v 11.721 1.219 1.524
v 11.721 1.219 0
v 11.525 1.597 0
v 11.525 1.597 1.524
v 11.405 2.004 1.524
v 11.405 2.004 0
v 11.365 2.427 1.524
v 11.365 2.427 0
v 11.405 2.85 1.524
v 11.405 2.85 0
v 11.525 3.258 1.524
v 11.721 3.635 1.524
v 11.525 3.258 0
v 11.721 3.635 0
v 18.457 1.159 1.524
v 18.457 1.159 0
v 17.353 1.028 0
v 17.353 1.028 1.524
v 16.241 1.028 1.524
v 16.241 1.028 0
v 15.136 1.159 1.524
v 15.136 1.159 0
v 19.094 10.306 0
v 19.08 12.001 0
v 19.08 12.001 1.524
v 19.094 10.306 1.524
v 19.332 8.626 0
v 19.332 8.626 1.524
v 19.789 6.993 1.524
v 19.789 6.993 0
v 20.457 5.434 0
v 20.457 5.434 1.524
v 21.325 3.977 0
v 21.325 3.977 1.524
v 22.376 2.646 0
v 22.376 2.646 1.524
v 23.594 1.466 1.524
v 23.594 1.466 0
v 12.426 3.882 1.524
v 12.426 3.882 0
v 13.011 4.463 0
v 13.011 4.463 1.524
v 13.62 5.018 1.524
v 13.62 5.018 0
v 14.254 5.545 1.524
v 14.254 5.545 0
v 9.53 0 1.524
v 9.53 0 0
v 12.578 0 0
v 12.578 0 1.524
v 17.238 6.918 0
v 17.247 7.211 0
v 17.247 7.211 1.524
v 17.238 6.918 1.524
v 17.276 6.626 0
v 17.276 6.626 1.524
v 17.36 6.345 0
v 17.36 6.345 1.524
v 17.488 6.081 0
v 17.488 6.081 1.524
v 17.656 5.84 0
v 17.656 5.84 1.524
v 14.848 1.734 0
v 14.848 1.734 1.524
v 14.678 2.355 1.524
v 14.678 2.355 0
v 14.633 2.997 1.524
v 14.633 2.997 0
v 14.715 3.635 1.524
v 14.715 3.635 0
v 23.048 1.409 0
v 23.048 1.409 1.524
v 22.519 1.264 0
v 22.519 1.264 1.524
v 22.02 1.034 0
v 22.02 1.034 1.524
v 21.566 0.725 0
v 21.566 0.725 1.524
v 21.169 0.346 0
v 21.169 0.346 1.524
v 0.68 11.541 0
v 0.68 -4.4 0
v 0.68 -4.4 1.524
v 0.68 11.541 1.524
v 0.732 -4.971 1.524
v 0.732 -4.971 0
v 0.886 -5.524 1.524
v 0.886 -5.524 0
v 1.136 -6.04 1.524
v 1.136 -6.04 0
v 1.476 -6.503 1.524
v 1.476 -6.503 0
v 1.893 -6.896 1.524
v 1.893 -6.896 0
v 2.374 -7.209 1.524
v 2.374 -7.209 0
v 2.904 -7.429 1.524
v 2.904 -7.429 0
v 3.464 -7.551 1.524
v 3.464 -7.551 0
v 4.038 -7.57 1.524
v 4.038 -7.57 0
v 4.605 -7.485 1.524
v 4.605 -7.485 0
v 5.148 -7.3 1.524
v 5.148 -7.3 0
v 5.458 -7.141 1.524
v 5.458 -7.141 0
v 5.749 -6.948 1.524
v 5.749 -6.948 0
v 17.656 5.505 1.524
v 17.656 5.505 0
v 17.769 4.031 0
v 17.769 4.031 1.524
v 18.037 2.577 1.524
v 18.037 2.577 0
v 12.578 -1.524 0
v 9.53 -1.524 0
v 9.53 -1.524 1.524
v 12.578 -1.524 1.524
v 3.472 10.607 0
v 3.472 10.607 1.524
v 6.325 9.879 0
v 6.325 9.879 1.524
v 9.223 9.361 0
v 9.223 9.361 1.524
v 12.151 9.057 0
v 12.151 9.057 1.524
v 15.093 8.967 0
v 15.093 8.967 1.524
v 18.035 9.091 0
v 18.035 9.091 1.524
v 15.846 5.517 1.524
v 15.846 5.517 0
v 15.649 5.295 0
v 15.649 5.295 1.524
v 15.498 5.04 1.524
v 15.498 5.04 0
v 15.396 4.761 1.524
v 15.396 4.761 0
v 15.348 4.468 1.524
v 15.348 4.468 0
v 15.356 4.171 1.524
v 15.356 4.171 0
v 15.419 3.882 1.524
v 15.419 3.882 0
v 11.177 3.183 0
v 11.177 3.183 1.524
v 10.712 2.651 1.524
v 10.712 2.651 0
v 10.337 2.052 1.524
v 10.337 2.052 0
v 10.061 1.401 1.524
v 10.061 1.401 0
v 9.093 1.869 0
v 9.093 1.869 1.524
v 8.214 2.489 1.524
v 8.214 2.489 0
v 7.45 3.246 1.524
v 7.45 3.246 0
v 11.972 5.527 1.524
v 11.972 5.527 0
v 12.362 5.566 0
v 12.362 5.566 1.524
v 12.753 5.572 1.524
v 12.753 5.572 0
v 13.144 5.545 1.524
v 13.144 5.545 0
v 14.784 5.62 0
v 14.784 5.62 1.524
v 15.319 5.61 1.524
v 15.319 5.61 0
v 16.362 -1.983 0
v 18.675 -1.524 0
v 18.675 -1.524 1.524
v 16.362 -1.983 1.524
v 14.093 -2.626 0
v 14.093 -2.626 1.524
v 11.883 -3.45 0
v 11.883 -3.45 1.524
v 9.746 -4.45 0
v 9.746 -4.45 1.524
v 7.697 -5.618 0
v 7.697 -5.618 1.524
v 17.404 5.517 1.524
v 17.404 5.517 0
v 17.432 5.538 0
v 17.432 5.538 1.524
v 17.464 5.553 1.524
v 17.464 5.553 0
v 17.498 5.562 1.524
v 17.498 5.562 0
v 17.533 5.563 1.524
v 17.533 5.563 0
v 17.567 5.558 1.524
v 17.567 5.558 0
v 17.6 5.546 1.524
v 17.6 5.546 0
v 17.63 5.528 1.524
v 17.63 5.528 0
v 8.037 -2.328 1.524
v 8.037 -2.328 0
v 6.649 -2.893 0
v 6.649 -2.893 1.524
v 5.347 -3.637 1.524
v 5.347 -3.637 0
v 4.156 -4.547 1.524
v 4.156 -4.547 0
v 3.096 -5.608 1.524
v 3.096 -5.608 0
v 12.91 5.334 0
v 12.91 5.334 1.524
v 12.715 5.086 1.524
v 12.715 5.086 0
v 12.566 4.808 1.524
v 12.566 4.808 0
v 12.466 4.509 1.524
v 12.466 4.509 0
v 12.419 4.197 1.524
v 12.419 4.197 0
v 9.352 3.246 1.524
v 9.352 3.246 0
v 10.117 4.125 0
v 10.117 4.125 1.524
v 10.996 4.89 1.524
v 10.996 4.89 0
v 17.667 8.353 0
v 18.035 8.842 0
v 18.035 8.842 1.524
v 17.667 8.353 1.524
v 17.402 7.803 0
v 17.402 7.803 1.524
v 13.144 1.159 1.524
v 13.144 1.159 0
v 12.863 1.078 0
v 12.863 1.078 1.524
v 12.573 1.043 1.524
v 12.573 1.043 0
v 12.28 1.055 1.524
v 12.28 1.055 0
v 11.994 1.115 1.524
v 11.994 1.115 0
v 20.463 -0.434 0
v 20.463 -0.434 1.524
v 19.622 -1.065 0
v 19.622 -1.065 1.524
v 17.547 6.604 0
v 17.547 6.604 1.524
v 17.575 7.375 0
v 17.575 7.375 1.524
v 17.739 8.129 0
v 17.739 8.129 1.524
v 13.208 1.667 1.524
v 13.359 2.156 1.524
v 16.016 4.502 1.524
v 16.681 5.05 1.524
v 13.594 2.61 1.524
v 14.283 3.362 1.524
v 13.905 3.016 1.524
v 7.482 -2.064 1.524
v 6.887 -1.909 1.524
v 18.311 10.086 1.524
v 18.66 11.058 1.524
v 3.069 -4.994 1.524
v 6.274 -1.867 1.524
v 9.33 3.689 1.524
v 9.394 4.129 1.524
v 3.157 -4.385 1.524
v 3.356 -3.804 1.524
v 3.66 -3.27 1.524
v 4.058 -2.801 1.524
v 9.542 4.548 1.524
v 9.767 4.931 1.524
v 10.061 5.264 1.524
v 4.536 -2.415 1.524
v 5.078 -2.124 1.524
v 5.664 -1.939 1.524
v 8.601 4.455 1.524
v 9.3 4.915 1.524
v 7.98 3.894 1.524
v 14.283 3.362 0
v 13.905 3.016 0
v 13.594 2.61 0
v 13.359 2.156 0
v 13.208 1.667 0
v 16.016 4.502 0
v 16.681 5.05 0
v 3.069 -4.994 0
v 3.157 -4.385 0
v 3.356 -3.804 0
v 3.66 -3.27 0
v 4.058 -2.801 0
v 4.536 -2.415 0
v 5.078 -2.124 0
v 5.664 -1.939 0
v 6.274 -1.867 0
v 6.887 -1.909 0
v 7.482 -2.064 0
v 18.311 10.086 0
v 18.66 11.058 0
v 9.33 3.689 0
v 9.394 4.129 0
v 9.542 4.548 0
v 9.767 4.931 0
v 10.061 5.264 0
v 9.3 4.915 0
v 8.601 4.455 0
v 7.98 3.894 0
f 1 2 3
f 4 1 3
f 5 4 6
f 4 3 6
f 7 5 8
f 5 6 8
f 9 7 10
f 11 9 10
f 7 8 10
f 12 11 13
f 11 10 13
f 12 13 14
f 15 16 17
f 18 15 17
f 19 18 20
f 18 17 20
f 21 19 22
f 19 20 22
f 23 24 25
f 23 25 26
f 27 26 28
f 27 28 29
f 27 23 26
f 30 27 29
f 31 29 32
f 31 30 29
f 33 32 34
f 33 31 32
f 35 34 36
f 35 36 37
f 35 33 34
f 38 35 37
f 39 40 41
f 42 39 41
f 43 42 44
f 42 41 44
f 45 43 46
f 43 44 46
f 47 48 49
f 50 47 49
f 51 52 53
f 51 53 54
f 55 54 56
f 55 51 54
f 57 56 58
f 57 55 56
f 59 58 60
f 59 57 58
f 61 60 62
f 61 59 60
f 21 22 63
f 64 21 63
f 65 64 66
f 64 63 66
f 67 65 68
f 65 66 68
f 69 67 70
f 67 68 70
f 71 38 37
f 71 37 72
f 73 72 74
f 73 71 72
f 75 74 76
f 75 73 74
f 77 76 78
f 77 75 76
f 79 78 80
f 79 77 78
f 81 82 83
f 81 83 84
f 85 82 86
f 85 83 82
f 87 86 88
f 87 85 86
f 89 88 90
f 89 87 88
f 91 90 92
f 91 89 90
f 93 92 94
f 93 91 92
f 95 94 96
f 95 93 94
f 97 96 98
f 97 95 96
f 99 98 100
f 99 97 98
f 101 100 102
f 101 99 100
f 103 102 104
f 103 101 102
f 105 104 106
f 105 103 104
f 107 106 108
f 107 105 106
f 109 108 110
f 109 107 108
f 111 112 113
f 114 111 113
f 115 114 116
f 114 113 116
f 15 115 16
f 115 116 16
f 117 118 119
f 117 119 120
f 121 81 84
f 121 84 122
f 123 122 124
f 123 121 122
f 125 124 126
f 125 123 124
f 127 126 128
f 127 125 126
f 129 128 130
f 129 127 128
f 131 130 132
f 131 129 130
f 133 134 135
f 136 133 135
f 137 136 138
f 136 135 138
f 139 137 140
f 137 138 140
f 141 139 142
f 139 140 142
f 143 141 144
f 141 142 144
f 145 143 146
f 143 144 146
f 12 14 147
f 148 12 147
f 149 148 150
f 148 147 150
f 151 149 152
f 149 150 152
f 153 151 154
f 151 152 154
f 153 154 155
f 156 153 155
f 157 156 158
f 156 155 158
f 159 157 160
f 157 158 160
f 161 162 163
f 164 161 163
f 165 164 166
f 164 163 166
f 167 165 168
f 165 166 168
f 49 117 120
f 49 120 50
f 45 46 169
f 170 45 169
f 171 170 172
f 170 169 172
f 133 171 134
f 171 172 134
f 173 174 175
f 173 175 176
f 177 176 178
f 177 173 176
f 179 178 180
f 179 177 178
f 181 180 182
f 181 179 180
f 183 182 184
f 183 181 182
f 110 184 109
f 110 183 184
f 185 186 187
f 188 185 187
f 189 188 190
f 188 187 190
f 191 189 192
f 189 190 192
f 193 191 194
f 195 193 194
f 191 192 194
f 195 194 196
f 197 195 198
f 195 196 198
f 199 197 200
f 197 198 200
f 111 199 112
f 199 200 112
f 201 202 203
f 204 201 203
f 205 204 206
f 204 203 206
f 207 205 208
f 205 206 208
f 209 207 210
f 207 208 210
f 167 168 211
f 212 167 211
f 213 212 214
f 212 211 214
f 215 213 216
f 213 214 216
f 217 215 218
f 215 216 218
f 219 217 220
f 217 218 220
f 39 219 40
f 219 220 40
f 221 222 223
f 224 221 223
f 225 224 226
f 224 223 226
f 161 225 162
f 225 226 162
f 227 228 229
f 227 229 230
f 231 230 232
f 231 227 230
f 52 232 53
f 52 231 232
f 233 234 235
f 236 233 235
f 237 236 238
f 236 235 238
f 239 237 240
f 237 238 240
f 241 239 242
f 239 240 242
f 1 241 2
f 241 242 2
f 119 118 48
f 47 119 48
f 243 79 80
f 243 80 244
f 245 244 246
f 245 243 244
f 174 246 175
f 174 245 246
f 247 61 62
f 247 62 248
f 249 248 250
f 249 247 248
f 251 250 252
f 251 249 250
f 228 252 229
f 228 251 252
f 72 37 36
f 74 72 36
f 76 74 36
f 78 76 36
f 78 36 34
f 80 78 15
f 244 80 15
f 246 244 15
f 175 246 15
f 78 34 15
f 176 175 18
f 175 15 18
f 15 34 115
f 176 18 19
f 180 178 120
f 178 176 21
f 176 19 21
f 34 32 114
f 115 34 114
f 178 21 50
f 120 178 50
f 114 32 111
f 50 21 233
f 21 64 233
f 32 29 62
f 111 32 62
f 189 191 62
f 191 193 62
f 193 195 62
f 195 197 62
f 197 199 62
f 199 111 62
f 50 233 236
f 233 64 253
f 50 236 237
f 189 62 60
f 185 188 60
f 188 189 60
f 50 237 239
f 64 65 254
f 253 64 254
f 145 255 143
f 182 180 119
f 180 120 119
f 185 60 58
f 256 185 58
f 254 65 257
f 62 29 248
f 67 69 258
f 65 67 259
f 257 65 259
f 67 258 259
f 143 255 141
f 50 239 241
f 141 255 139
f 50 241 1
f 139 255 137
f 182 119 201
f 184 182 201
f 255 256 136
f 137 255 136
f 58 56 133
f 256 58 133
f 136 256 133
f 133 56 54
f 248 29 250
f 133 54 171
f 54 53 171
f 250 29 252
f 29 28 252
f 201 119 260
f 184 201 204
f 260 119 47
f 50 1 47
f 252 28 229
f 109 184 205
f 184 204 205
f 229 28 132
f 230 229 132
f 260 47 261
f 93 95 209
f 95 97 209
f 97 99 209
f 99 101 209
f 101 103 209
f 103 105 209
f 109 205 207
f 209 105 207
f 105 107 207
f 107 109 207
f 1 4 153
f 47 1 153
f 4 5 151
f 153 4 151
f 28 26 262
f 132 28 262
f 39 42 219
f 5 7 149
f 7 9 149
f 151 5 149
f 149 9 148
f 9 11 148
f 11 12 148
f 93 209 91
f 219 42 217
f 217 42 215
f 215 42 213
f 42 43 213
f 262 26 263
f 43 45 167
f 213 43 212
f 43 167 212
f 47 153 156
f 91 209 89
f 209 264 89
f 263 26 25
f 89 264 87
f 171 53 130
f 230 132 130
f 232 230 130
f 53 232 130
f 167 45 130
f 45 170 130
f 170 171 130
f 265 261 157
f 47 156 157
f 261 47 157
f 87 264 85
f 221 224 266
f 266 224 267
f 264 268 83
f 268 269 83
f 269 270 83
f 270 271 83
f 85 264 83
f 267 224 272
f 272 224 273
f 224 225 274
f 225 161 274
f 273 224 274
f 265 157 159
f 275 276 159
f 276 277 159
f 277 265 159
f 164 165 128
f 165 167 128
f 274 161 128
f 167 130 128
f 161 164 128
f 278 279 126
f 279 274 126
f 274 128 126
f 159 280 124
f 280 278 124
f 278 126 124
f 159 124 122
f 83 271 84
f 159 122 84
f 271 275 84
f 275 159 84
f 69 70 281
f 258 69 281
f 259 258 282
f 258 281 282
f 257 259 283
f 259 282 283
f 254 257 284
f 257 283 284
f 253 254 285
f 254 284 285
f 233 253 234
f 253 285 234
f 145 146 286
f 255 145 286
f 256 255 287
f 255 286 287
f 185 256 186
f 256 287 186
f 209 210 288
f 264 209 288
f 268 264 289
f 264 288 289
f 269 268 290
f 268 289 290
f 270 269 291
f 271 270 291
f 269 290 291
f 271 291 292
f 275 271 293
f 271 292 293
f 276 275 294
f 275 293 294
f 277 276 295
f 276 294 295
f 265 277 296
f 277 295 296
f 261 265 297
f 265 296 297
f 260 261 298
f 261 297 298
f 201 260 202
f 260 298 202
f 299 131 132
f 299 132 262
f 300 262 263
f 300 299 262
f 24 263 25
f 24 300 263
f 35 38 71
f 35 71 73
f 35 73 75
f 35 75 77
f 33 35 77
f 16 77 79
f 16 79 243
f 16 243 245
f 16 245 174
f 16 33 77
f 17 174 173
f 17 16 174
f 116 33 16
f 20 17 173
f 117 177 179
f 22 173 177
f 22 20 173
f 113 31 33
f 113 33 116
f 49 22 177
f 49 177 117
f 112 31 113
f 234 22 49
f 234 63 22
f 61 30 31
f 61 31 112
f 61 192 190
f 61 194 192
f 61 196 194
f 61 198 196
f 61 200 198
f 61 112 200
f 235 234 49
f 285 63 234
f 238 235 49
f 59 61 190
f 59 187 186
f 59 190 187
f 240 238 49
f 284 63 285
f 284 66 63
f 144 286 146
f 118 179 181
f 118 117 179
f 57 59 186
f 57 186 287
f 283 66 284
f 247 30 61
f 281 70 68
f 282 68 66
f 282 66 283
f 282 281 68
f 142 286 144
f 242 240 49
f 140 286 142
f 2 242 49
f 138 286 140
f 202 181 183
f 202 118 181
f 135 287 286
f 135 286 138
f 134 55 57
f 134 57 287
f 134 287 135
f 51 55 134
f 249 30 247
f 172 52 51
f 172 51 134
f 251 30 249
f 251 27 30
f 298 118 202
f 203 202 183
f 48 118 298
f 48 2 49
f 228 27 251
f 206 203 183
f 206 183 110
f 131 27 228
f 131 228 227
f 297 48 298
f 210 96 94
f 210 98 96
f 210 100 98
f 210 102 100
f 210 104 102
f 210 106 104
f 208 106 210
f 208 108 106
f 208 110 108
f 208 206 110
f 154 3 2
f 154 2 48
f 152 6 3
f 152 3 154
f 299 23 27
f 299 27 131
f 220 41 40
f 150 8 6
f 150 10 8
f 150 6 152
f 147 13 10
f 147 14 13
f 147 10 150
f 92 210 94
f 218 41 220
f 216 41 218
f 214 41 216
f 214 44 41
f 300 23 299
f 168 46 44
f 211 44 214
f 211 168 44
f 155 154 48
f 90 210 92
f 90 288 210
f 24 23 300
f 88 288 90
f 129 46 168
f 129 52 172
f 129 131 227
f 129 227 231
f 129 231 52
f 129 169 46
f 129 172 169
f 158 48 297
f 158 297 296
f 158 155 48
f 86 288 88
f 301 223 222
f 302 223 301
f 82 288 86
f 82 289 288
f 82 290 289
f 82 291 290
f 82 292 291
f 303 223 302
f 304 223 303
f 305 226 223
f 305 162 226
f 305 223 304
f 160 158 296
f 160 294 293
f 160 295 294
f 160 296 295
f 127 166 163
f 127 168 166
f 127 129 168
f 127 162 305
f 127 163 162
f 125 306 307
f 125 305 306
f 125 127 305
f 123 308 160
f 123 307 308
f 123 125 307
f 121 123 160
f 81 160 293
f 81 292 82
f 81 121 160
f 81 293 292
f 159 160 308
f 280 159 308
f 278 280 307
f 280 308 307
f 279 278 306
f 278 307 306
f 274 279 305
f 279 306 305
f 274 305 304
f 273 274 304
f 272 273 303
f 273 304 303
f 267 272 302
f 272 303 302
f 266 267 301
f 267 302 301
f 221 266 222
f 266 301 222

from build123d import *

# Parameters (mm, degrees)
SKETCH1_W           = 3.048
SKETCH1_H           = 1.524
BOSS_EXTRUDE1_DEPTH = 1.524
FILLET4_R           = 3.175


with BuildPart() as part:
    # Sketch1 → Boss-Extrude1 (new body)
    with BuildSketch(Plane.XY):
        with BuildLine():
            Line((0.680153889, -6.129418594), (0.680153889, 11.540681963))
            ThreePointArc((0.680153889, 11.540681963), (9.222616512, 9.36144264), (18.034529819, 9.091376803))
            ThreePointArc((18.034529819, 9.091376803), (18.476514137, 10.575327988), (19.079546917, 12.001446047))
            ThreePointArc((19.079546917, 12.001446047), (20.097392283, 6.202497031), (23.594187572, 1.465806036))
            ThreePointArc((23.594187572, 1.465806036), (22.264781917, 1.159048918), (21.169318906, 0.345796118))
            ThreePointArc((21.169318906, 0.345796118), (20.057462236, -0.769306292), (18.675392755, -1.524))
            ThreePointArc((18.675392755, -1.524), (10.681603645, -3.986495409), (3.71145902, -8.610523078))
            ThreePointArc((3.71145902, -8.610523078), (1.563251963, -8.142798296), (0.680153889, -6.129418594))
        make_face()
        with Locations((11.054430571, -0.762)):
            Rectangle(SKETCH1_W, SKETCH1_H, mode=Mode.SUBTRACT)
        with BuildLine():
            ThreePointArc((18.457205049, 1.159048918), (16.796602855, 1.012131062), (15.13600066, 1.159048918))
            ThreePointArc((15.13600066, 1.159048918), (14.678205729, 2.355037825), (14.715312916, 3.635111542))
            ThreePointArc((14.715312916, 3.635111542), (13.593992305, 2.610148755), (13.144305869, 1.159048918))
            ThreePointArc((13.144305869, 1.159048918), (12.426226698, 1.043141082), (11.720524566, 1.219370545))
            ThreePointArc((11.720524566, 1.219370545), (11.364676413, 2.427241044), (11.720524566, 3.635111542))
            ThreePointArc((11.720524566, 3.635111542), (10.712351561, 2.650528395), (10.061249405, 1.400775314))
            ThreePointArc((10.061249405, 1.400775314), (8.64082558, 2.160669947), (7.450155331, 3.245726654))
            ThreePointArc((7.450155331, 3.245726654), (8.601081625, 4.454929507), (10.061249405, 5.264072837))
            ThreePointArc((10.061249405, 5.264072837), (9.457771061, 4.34236946), (9.352425063, 3.245726654))
            ThreePointArc((9.352425063, 3.245726654), (10.543430802, 4.522443251), (11.971709271, 5.526694491))
            ThreePointArc((11.971709271, 5.526694491), (12.557411502, 5.573473862), (13.144305869, 5.545359518))
            ThreePointArc((13.144305869, 5.545359518), (12.566006589, 4.808091463), (12.426226698, 3.881562551))
            ThreePointArc((12.426226698, 3.881562551), (13.312490945, 4.743692313), (14.253799466, 5.545359518))
            ThreePointArc((14.253799466, 5.545359518), (15.051720121, 5.625849498), (15.84620994, 5.516570329))
            ThreePointArc((15.84620994, 5.516570329), (15.396051863, 4.760868409), (15.419480332, 3.881562551))
            ThreePointArc((15.419480332, 3.881562551), (16.340692115, 4.785475695), (17.404266633, 5.516570329))
            ThreePointArc((17.404266633, 5.516570329), (17.532648387, 5.563352566), (17.656087794, 5.504759346))
            ThreePointArc((17.656087794, 5.504759346), (17.884238381, 3.300121283), (18.457205049, 1.159048918))
        make_face(mode=Mode.SUBTRACT)
        with BuildLine():
            ThreePointArc((17.656087794, 5.840129035), (17.574660077, 7.375234106), (18.034529819, 8.84210079))
            ThreePointArc((18.034529819, 8.84210079), (17.521152532, 8.084430816), (17.246705878, 7.211333419))
            ThreePointArc((17.246705878, 7.211333419), (17.311898149, 6.484082994), (17.656087794, 5.840129035))
        make_face(mode=Mode.SUBTRACT)
        with BuildLine():
            ThreePointArc((8.037489597, -2.327562697), (5.34711842, -3.636841183), (3.096001374, -5.607825523))
            ThreePointArc((3.096001374, -5.607825523), (4.535873462, -2.414756972), (8.037489597, -2.327562697))
        make_face(mode=Mode.SUBTRACT)
    extrude(amount=BOSS_EXTRUDE1_DEPTH)

    # Fillet4
    fillet4_edges = [part.edges().sort_by_distance(p)[0] for p in [
        (3.71145902, -8.610523078, 0.762),
    ]]
    fillet(fillet4_edges, radius=FILLET4_R)


solid = part.part
